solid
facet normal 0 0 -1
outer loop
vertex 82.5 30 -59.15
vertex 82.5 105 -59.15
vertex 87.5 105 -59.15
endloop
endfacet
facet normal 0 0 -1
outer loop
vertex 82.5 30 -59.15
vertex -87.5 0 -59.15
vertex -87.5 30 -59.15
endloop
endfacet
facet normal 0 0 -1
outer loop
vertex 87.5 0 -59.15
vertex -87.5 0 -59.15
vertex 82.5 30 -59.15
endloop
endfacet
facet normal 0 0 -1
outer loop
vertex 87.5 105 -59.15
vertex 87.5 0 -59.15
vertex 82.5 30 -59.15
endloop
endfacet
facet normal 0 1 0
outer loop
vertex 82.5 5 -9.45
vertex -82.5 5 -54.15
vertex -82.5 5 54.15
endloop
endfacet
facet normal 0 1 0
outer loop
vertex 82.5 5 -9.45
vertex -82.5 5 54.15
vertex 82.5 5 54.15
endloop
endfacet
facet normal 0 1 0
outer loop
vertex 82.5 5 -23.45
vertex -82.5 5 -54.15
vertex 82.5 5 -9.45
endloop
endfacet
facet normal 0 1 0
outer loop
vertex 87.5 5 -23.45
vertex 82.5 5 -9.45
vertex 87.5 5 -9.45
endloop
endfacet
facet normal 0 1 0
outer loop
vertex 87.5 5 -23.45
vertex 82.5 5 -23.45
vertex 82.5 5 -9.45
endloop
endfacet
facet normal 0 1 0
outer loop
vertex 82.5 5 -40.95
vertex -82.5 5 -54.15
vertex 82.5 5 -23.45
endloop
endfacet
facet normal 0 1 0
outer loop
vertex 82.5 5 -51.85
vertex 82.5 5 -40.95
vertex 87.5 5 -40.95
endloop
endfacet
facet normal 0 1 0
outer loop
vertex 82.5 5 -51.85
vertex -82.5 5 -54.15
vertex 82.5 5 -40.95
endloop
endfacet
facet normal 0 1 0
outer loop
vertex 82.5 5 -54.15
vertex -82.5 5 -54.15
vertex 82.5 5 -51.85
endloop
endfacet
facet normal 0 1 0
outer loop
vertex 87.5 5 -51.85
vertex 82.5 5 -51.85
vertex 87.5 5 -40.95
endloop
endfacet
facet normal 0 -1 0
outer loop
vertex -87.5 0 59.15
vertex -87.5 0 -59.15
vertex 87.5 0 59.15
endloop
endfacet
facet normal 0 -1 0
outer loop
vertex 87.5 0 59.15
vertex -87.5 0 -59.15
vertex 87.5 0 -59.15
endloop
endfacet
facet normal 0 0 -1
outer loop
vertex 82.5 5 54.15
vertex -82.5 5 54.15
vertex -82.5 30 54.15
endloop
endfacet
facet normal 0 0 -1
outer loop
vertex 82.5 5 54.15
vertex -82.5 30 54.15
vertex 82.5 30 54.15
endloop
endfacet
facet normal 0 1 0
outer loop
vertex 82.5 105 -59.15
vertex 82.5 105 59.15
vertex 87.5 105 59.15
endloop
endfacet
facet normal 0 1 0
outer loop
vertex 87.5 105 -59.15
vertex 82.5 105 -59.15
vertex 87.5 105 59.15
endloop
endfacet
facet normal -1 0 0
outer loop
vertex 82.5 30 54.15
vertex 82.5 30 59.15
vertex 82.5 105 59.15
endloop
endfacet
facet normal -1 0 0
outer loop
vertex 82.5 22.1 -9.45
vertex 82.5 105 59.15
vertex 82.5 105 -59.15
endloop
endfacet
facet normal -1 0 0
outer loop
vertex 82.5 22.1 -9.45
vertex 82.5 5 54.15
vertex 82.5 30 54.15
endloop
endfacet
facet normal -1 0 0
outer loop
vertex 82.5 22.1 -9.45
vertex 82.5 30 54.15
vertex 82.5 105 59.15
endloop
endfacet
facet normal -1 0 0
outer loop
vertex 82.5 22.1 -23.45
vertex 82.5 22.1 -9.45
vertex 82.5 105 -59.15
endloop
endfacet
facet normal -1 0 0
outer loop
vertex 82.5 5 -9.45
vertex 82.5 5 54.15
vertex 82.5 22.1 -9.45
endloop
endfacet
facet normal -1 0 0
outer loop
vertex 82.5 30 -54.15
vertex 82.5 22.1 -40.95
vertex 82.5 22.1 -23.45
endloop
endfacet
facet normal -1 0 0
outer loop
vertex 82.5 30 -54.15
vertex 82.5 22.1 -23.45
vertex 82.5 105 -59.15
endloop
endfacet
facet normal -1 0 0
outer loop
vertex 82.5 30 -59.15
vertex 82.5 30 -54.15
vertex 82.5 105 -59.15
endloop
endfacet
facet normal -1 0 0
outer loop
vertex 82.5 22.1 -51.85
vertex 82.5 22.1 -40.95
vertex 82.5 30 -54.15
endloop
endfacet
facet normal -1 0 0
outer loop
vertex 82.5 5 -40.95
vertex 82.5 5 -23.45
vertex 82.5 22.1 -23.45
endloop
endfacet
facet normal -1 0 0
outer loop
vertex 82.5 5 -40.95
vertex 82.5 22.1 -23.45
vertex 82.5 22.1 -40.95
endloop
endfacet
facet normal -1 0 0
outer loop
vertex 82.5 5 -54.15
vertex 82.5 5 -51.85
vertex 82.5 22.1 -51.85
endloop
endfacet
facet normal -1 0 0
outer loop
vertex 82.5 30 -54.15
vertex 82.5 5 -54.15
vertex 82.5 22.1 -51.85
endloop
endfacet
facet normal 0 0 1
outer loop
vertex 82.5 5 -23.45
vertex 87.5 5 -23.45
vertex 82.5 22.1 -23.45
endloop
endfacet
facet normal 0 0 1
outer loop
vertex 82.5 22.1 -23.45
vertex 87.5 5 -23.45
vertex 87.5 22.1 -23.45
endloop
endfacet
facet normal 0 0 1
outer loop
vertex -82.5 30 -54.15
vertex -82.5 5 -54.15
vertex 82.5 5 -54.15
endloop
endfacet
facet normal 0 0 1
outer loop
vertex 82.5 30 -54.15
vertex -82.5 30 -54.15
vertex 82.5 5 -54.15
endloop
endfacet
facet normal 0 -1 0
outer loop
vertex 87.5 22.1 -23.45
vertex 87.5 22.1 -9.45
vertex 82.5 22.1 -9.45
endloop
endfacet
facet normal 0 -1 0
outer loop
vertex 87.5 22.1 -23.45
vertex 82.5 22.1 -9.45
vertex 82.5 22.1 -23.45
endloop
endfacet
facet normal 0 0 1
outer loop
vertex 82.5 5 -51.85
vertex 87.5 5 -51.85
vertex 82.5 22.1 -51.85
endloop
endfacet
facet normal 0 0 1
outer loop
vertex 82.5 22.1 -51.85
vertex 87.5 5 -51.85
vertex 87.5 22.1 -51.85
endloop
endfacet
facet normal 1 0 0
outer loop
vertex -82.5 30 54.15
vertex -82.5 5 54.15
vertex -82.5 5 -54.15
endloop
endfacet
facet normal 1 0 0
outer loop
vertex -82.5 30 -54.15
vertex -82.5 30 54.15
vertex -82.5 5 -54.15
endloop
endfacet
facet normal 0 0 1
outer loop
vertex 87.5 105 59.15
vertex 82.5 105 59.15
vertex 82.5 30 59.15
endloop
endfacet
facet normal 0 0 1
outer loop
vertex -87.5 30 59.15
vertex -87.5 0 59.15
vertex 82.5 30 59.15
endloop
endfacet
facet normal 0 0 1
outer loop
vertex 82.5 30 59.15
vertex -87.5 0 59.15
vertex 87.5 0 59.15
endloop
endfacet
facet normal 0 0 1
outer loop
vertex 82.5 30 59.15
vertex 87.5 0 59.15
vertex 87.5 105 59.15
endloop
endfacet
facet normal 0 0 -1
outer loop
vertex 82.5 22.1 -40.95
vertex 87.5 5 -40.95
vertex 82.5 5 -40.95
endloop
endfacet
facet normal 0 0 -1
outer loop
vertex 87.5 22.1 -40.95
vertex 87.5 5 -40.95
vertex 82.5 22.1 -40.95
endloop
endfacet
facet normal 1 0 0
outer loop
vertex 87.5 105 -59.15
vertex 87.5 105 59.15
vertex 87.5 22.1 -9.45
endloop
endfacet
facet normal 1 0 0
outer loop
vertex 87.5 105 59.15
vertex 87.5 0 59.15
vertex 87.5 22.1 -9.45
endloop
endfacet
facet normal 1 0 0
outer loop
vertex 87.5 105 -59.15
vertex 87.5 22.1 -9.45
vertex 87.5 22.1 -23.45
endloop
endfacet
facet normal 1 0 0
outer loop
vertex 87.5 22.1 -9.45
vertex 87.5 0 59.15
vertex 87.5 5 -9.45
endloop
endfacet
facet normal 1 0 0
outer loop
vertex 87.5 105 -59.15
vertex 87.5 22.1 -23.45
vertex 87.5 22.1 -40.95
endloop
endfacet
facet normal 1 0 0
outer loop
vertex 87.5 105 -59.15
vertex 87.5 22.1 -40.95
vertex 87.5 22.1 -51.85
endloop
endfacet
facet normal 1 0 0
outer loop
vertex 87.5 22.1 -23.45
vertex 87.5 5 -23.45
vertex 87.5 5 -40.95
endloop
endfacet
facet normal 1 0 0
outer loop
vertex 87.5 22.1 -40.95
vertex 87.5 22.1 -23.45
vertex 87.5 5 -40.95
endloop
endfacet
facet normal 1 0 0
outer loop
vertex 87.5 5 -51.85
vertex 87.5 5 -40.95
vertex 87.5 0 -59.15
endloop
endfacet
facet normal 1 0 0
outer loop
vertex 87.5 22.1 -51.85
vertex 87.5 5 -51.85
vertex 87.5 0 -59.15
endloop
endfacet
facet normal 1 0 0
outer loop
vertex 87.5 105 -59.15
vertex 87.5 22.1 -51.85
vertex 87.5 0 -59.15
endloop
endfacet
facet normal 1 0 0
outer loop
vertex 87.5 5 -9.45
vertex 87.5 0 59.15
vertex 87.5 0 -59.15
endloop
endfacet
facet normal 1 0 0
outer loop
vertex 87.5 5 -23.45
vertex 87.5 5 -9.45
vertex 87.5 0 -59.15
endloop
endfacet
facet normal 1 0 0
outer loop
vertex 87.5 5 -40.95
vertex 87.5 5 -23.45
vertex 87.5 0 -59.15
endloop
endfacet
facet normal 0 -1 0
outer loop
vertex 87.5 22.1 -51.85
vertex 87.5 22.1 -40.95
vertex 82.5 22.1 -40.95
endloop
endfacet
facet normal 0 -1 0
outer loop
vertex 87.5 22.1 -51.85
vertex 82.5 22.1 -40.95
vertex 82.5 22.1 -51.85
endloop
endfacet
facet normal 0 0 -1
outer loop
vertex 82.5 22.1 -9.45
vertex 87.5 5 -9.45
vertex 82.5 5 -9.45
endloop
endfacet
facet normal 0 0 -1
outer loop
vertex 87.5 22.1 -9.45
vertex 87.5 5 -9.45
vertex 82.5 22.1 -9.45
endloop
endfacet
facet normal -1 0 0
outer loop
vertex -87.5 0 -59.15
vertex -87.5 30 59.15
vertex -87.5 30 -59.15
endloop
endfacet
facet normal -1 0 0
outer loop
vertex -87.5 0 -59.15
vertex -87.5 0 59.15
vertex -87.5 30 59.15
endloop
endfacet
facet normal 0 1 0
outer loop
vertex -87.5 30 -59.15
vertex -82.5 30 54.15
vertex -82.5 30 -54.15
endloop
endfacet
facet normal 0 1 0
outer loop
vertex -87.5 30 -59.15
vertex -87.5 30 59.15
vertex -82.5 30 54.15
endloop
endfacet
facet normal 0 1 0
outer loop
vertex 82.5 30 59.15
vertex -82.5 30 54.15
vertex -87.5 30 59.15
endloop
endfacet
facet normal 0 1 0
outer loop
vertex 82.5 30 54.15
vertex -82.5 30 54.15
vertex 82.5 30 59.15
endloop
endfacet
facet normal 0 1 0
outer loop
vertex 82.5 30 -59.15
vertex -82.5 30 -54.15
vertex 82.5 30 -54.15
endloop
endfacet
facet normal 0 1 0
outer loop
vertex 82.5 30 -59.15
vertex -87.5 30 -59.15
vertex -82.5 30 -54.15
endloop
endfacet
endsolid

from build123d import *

# Parameters (mm, degrees)
SZKIC1_W                    = 175
SZKIC1_H                    = 118.3
DODANIE_WYCI_GNI_CIE1_DEPTH = 5
SZKIC2_W                    = 5
SZKIC2_H                    = 118.3
DODANIE_WYCI_GNI_CIE2_DEPTH = 25
SZKIC3_W                    = 5
SZKIC3_H                    = 118.3
DODANIE_WYCI_GNI_CIE3_DEPTH = 100
SZKIC4_W                    = 165
SZKIC4_H                    = 5
DODANIE_WYCI_GNI_CIE4_DEPTH = 25
SZKIC5_W                    = 165
SZKIC5_H                    = 5
DODANIE_WYCI_GNI_CIE5_DEPTH = 25
WYTNIJ_WYCI_GNI_CIE1_REACH  = 214.482
SZKIC7_W                    = 14
SZKIC7_H                    = 17.1
WYTNIJ_WYCI_GNI_CIE2_REACH  = 214.482
SZKIC8_W                    = 10.9
SZKIC8_H                    = 17.1


with BuildPart() as part:
    # Szkic1 → Dodanie-wyciągnięcie1 (new body)
    with BuildSketch(Plane(origin=(0, 0, 0), x_dir=(1, 0, 0), z_dir=(0, 1, 0))):
        Rectangle(SZKIC1_W, SZKIC1_H)
    extrude(amount=DODANIE_WYCI_GNI_CIE1_DEPTH)

    # Szkic2 → Dodanie-wyciągnięcie2 (add)
    with BuildSketch(Plane(origin=(0, 5, 0), x_dir=(1, 0, 0), z_dir=(0, 1, 0))):
        with Locations((-85, 0)):
            Rectangle(SZKIC2_W, SZKIC2_H)
    extrude(amount=DODANIE_WYCI_GNI_CIE2_DEPTH)

    # Szkic3 → Dodanie-wyciągnięcie3 (add)
    with BuildSketch(Plane(origin=(0, 5, 0), x_dir=(1, 0, 0), z_dir=(0, 1, 0))):
        with Locations((85, 0)):
            Rectangle(SZKIC3_W, SZKIC3_H)
    extrude(amount=DODANIE_WYCI_GNI_CIE3_DEPTH)

    # Szkic4 → Dodanie-wyciągnięcie4 (add)
    with BuildSketch(Plane(origin=(0, 5, 0), x_dir=(1, 0, 0), z_dir=(0, 1, 0))):
        with Locations((0, -56.65)):
            Rectangle(SZKIC4_W, SZKIC4_H)
    extrude(amount=DODANIE_WYCI_GNI_CIE4_DEPTH)

    # Szkic5 → Dodanie-wyciągnięcie5 (add)
    with BuildSketch(Plane(origin=(0, 5, 0), x_dir=(1, 0, 0), z_dir=(0, 1, 0))):
        with Locations((0, 56.65)):
            Rectangle(SZKIC5_W, SZKIC5_H)
    extrude(amount=DODANIE_WYCI_GNI_CIE5_DEPTH)

    # Szkic7 → Wytnij-wyciągnięcie1 (cut, up to next)
    with BuildSketch(Plane(origin=(87.5, 0, 0), x_dir=(0, 0, -1), z_dir=(1, 0, 0)), mode=Mode.PRIVATE) as wytnij_wyci_gni_cie1_sk1:
        with Locations((16.45, 13.55)):
            Rectangle(SZKIC7_W, SZKIC7_H)
    wytnij_wyci_gni_cie1_tool1 = extrude(wytnij_wyci_gni_cie1_sk1.sketch, amount=-WYTNIJ_WYCI_GNI_CIE1_REACH, mode=Mode.PRIVATE) & part.part
    add(wytnij_wyci_gni_cie1_tool1.solids().sort_by_distance((87.5, 13.55, -16.45))[0], mode=Mode.SUBTRACT)

    # Szkic8 → Wytnij-wyciągnięcie2 (cut, up to next)
    with BuildSketch(Plane(origin=(87.5, 0, 0), x_dir=(0, 0, -1), z_dir=(1, 0, 0)), mode=Mode.PRIVATE) as wytnij_wyci_gni_cie2_sk1:
        with Locations((46.4, 13.55)):
            Rectangle(SZKIC8_W, SZKIC8_H)
    wytnij_wyci_gni_cie2_tool1 = extrude(wytnij_wyci_gni_cie2_sk1.sketch, amount=-WYTNIJ_WYCI_GNI_CIE2_REACH, mode=Mode.PRIVATE) & part.part
    add(wytnij_wyci_gni_cie2_tool1.solids().sort_by_distance((87.5, 13.55, -46.4))[0], mode=Mode.SUBTRACT)


solid = part.part
